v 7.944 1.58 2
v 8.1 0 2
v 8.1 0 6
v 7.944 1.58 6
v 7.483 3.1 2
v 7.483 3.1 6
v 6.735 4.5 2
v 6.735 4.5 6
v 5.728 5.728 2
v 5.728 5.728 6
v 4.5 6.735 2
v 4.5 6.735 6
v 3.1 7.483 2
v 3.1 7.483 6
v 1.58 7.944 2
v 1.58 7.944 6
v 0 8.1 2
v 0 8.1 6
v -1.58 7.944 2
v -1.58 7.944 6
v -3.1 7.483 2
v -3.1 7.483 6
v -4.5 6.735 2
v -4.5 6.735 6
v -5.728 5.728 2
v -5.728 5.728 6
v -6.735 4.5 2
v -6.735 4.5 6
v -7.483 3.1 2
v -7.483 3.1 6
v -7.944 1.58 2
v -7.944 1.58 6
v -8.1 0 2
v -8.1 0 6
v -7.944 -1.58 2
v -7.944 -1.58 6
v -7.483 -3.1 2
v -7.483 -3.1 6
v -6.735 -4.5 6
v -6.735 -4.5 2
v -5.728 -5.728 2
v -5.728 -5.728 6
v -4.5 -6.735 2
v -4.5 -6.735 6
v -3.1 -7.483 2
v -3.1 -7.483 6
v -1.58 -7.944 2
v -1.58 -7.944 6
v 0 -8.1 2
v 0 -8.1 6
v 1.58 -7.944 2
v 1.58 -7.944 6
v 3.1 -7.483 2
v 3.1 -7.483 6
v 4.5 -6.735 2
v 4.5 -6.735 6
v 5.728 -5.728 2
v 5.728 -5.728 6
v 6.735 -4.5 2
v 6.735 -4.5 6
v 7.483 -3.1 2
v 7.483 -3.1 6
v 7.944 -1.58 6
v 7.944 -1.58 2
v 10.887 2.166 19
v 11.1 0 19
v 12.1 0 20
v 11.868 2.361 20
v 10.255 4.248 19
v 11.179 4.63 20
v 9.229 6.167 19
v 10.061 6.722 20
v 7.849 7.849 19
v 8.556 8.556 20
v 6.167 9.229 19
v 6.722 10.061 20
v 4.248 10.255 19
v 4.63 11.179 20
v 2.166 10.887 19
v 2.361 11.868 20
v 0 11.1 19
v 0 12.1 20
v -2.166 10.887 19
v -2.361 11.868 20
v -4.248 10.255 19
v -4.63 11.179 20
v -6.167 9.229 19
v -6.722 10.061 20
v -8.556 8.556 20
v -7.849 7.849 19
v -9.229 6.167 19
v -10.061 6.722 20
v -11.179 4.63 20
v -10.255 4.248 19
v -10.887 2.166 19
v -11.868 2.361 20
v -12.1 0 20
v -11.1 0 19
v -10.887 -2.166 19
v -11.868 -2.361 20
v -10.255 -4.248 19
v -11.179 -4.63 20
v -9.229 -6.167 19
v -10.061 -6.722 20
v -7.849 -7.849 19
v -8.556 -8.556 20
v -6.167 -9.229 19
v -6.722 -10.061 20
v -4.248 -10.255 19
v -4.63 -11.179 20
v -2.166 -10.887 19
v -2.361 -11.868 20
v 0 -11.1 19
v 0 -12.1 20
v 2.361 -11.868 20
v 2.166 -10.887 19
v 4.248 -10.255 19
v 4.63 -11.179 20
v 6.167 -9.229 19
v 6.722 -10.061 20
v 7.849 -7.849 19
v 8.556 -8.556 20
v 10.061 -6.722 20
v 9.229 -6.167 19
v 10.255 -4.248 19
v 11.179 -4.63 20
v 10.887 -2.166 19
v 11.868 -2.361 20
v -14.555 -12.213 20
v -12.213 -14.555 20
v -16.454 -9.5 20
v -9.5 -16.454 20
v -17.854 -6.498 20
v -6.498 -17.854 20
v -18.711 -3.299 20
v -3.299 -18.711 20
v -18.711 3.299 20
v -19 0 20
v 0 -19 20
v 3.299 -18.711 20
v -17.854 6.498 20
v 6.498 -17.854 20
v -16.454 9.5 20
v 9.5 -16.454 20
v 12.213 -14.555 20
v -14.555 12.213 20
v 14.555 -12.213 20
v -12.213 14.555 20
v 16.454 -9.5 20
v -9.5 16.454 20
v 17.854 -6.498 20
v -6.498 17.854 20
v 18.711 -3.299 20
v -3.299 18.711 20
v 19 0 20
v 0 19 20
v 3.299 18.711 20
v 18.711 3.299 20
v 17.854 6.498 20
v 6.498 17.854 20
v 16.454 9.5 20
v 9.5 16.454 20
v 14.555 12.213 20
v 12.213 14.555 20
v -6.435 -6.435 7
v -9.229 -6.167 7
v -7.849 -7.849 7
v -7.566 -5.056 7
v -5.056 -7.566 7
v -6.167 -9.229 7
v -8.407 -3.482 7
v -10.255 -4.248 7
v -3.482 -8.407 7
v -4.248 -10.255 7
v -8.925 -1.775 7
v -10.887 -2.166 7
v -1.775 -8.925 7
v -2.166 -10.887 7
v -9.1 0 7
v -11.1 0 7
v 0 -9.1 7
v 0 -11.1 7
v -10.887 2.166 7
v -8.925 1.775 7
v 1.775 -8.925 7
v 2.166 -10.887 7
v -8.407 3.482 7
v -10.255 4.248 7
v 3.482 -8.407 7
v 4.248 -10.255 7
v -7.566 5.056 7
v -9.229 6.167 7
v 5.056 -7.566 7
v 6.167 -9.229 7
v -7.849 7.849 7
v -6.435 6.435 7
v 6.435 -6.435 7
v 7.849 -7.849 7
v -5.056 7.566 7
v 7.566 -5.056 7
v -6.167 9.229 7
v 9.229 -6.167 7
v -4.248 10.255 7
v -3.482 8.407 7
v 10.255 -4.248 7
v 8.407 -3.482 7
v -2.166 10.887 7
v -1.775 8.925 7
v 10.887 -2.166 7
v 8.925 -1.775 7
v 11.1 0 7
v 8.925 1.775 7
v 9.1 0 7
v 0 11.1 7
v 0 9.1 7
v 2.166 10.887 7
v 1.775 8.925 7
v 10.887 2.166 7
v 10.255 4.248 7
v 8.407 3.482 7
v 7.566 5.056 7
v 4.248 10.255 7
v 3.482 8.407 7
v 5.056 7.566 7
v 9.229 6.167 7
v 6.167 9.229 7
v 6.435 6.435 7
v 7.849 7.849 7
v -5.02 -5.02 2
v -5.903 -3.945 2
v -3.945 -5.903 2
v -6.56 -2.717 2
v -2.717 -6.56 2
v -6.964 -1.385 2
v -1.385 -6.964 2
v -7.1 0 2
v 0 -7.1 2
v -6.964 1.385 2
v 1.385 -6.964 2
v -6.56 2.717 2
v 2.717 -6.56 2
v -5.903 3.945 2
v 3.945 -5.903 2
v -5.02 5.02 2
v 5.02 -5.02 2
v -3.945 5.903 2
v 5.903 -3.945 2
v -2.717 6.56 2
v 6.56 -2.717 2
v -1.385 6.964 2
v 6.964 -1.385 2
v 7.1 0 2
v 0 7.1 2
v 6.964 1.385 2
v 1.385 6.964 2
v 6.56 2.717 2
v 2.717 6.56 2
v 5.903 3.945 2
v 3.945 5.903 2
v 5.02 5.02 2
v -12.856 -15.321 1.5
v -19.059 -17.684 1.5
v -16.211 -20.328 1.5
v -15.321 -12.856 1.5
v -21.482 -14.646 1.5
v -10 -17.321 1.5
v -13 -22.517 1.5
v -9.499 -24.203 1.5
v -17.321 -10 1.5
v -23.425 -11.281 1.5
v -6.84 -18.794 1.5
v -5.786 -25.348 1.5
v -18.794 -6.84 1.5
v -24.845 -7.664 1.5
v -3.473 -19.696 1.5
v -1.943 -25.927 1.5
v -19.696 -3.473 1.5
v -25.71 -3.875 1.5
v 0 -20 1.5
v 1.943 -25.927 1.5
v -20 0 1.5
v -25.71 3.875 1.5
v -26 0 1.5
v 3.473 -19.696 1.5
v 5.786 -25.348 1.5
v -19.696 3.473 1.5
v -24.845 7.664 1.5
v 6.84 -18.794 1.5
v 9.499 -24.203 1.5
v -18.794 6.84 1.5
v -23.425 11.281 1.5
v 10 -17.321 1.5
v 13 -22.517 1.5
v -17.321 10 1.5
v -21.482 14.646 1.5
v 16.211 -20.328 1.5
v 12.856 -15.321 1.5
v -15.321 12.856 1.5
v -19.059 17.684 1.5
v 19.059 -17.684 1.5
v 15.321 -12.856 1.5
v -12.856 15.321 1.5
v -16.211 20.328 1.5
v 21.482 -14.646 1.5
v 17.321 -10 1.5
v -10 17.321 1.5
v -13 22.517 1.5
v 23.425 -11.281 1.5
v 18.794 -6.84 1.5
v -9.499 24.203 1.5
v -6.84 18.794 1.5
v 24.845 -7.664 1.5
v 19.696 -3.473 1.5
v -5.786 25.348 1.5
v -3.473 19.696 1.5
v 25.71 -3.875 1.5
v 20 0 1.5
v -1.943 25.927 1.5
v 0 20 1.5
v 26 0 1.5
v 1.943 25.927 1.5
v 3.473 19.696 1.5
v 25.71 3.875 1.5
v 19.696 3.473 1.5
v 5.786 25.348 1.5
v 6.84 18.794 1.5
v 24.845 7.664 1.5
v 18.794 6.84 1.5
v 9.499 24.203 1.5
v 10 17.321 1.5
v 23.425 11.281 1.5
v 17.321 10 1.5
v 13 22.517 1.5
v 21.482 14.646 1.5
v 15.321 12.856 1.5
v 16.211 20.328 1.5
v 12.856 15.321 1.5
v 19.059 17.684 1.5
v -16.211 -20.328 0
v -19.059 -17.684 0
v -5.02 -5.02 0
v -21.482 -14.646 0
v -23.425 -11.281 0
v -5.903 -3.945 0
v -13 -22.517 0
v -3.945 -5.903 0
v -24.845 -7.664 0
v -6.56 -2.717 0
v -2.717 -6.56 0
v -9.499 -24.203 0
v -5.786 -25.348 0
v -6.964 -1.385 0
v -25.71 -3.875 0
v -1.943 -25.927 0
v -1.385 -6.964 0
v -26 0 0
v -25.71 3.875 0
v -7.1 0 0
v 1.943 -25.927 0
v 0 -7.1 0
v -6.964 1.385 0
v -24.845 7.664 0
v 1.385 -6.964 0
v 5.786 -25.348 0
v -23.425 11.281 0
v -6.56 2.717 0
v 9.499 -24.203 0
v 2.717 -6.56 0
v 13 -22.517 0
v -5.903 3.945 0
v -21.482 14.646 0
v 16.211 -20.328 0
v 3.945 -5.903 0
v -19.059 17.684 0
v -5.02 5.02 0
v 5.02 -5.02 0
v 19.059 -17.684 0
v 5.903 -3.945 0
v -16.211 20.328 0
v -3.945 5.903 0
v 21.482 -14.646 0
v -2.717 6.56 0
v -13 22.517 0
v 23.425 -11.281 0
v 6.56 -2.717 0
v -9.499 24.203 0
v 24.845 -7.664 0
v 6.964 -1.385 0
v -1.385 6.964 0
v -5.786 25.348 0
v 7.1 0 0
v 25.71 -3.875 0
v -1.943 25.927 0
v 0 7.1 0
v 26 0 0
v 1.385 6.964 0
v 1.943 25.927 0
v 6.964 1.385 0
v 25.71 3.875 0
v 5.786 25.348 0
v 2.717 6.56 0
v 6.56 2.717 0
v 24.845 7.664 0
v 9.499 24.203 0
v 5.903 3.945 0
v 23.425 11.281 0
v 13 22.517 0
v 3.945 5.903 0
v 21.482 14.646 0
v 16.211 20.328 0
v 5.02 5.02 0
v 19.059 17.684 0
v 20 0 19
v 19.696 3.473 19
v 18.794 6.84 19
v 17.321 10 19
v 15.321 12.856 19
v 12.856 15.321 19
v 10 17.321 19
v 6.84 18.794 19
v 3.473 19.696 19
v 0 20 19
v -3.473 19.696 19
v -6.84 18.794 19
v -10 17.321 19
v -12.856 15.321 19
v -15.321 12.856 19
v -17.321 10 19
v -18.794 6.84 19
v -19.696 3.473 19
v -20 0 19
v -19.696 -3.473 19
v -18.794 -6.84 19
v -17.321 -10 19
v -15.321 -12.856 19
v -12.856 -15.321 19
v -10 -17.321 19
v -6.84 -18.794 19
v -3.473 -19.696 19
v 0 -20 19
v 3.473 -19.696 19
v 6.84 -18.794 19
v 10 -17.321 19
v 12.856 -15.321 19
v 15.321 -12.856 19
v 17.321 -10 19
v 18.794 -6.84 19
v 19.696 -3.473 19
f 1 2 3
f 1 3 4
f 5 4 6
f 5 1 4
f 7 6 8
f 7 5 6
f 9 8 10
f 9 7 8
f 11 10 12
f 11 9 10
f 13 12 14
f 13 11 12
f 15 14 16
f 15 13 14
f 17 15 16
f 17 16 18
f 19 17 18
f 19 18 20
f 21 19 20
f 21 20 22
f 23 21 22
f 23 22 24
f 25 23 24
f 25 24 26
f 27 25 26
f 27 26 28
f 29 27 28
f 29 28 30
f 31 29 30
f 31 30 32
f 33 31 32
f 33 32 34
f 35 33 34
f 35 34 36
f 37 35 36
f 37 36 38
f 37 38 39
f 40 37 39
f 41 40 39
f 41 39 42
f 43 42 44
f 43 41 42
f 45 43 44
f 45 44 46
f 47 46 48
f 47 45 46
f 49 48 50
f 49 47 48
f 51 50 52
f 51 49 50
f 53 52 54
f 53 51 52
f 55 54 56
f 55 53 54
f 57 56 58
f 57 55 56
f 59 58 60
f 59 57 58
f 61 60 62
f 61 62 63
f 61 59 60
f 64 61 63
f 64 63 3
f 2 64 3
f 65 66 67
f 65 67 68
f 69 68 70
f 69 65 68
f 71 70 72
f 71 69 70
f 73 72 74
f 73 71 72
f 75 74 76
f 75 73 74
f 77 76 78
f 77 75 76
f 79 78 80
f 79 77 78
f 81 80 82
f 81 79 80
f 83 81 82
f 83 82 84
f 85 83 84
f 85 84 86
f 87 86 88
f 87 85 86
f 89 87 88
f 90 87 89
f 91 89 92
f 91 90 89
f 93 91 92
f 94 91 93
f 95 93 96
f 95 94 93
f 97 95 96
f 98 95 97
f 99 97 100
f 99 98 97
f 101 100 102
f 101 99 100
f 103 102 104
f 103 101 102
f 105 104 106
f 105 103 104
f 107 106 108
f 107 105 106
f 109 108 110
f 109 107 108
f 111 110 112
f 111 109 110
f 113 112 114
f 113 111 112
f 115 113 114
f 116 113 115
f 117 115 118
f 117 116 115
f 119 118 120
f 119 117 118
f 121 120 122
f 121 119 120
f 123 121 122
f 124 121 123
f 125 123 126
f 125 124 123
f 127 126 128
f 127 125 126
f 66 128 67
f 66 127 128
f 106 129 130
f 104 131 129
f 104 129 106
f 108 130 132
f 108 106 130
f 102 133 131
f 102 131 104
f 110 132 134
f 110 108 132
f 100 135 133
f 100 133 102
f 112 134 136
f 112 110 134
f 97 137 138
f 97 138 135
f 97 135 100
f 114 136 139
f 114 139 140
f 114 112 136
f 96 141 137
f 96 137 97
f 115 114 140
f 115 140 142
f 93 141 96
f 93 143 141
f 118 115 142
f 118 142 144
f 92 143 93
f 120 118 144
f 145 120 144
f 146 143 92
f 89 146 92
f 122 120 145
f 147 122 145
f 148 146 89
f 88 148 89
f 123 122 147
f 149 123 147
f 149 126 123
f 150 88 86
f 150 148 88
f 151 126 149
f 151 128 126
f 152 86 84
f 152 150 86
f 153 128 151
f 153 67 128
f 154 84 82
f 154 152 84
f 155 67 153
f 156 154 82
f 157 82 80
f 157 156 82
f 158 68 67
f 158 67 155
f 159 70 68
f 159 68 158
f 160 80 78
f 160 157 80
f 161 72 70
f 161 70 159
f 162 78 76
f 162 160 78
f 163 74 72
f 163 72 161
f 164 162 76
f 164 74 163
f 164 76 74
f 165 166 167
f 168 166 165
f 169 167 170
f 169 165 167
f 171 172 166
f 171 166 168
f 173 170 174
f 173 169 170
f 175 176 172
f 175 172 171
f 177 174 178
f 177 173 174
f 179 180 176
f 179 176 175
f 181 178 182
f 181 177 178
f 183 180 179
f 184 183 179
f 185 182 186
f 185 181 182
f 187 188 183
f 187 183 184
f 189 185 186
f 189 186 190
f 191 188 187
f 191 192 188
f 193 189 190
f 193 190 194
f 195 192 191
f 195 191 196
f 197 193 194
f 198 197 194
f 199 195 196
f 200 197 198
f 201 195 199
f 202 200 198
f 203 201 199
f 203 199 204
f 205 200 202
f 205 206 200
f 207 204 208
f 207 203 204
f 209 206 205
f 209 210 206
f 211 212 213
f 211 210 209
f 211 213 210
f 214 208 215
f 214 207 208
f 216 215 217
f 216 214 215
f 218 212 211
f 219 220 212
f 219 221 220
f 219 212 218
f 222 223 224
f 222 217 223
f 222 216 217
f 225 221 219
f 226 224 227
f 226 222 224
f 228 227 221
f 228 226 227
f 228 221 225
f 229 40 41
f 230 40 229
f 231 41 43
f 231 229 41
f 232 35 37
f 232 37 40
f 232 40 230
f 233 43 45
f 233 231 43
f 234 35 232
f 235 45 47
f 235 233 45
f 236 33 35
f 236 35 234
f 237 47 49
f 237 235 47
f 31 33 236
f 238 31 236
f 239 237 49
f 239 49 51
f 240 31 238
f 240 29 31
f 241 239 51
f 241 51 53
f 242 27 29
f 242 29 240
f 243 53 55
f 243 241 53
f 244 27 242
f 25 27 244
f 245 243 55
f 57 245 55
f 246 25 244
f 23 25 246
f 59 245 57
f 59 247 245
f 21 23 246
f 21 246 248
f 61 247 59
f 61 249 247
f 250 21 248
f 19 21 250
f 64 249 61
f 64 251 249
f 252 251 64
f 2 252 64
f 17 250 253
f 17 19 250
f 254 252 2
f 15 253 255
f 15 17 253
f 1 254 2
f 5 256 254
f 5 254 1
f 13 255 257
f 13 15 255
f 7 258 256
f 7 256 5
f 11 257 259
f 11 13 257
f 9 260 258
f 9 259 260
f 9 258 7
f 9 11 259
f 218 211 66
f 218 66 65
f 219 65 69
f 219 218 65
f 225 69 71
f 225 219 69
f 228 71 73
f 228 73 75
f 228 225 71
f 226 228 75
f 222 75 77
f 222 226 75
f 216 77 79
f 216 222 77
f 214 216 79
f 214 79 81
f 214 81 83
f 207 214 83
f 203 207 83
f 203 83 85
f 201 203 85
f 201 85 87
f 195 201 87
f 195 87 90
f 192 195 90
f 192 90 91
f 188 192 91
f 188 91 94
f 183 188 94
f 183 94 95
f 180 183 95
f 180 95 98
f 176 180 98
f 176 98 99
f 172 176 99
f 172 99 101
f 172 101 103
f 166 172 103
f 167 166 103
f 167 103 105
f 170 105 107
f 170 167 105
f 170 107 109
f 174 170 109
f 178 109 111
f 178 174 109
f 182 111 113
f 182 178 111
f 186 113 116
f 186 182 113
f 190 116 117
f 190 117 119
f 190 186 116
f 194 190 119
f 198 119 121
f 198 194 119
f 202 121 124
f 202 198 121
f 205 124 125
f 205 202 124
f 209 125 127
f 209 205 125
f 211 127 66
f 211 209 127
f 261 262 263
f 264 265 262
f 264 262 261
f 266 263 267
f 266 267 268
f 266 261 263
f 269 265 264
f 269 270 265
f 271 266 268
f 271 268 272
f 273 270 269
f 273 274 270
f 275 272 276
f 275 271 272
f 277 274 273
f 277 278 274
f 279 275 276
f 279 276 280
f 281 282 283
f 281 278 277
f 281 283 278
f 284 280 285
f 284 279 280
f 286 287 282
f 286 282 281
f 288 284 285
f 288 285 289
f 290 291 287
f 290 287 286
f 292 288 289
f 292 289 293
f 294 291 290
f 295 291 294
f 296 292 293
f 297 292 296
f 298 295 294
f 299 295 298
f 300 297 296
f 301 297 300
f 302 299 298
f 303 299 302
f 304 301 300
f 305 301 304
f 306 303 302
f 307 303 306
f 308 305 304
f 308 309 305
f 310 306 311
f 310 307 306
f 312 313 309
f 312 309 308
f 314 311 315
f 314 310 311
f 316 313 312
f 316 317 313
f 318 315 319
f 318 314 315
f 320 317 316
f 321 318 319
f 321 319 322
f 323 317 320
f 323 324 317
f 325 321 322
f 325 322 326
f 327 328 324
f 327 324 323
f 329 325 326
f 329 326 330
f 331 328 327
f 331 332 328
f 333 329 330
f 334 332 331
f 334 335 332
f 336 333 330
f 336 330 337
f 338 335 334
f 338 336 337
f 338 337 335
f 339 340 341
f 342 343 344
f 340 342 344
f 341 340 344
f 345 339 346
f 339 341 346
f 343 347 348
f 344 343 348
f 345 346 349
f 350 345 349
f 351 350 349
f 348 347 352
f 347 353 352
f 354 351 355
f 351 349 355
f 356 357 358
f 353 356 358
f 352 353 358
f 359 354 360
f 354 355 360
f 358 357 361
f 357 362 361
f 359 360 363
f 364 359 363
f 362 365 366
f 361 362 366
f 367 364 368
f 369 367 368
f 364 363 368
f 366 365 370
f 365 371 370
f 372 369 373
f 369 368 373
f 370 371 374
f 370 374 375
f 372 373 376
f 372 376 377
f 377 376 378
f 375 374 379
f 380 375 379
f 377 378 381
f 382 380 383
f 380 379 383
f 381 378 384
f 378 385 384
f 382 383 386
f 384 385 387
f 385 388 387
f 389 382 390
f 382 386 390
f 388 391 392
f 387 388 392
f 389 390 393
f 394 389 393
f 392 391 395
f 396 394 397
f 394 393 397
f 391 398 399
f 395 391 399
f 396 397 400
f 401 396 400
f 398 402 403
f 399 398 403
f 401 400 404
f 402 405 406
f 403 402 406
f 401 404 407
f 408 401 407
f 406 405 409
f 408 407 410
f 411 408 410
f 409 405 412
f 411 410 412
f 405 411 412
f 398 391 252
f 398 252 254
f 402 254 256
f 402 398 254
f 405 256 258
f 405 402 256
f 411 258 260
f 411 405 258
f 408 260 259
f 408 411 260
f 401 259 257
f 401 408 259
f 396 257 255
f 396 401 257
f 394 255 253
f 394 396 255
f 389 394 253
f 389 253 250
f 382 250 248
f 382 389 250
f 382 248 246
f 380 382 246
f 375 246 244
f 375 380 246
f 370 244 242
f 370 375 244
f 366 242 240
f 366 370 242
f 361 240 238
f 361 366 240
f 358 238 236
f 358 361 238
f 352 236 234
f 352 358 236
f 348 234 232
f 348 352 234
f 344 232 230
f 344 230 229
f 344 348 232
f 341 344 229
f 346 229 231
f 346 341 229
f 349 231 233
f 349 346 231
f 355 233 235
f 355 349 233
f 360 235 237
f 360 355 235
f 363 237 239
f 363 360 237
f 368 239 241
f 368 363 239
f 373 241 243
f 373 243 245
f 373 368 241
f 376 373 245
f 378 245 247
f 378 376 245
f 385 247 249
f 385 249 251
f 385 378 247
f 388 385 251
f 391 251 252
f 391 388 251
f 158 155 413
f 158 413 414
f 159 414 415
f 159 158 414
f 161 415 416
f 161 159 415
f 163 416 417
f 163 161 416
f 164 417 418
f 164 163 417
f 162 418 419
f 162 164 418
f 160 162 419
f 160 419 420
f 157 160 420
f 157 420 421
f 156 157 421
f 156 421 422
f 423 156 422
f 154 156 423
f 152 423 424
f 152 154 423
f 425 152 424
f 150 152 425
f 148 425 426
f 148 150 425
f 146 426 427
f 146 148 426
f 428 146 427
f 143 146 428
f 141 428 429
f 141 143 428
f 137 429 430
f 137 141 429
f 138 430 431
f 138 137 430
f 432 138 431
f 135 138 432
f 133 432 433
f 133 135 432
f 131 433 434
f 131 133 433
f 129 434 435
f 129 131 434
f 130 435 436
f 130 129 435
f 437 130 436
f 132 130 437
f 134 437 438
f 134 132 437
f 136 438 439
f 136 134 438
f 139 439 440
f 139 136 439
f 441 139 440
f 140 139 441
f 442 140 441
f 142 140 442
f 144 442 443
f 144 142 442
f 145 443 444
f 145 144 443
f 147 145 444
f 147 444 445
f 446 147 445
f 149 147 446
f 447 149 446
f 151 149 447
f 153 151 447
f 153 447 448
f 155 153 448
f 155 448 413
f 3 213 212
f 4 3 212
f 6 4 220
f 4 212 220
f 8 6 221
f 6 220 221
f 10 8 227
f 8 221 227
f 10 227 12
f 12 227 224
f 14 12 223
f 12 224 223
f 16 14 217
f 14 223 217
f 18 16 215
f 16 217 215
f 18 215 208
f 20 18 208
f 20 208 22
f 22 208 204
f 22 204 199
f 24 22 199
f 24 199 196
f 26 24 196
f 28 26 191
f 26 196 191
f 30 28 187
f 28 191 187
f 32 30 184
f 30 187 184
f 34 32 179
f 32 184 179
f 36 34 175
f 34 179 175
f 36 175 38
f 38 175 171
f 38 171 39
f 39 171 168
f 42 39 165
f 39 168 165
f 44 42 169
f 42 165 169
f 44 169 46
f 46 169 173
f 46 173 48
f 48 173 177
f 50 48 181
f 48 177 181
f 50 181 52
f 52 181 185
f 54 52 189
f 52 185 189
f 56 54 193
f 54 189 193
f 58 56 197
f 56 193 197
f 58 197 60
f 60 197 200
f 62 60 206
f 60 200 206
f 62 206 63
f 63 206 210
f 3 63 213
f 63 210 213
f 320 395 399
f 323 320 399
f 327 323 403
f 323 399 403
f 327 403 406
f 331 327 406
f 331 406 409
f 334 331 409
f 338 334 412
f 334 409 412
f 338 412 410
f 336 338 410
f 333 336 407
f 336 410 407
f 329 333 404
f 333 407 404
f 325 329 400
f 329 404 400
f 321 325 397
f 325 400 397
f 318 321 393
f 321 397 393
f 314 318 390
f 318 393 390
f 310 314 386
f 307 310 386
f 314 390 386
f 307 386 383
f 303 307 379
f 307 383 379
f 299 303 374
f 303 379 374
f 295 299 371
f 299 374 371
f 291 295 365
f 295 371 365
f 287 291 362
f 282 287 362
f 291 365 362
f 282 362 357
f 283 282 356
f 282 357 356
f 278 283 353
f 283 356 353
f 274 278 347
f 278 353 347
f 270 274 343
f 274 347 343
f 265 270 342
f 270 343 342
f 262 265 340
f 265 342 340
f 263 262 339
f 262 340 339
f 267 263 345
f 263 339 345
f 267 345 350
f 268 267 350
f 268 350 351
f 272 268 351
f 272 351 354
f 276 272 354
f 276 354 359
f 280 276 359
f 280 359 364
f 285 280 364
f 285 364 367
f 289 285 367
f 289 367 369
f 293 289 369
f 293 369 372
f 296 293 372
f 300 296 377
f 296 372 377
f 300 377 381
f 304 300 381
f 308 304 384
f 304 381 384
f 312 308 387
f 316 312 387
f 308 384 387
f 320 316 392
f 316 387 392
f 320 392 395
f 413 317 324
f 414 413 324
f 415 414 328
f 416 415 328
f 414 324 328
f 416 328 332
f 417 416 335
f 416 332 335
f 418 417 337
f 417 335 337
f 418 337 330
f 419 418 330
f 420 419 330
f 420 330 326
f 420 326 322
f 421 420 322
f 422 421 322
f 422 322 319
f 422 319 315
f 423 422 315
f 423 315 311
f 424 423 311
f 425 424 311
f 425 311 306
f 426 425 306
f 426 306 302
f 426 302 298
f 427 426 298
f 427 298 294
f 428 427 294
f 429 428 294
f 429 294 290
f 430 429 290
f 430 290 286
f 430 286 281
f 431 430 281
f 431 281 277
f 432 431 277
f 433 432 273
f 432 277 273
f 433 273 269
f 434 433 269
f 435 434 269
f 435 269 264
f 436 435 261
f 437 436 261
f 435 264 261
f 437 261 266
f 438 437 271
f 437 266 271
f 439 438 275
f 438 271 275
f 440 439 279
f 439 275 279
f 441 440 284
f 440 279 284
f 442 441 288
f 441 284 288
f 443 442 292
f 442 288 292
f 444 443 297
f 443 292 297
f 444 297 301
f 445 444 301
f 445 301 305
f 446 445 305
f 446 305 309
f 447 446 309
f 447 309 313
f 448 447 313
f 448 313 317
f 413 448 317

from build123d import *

# Parameters (mm, degrees)
F0_R     = 8.1
F0_R_2   = 7.1
F1_DEPTH = 2
F0_R_3   = 11.1
F2_DEPTH = 7
F0_R_4   = 20
F3_DEPTH = 20
F0_R_5   = 26
F4_DEPTH = 1.5
F5_SIZE  = 1


with BuildPart() as f1:
    # F0 (on Top) → F1 (new body)
    with BuildSketch(Plane.XY):
        Circle(F0_R)
        Circle(F0_R_2, mode=Mode.SUBTRACT)
    extrude(amount=F1_DEPTH)

    # F0 (on Top) → F2 (join)
    with BuildSketch(Plane.XY):
        Circle(F0_R_3)
        Circle(F0_R, mode=Mode.SUBTRACT)
    extrude(amount=F2_DEPTH)

    # F0 (on Top) → F3 (join)
    with BuildSketch(Plane.XY):
        Circle(F0_R_4)
        Circle(F0_R_3, mode=Mode.SUBTRACT)
    extrude(amount=F3_DEPTH)

    # F0 (on Top) → F4 (join)
    with BuildSketch(Plane.XY):
        Circle(F0_R_5)
        Circle(F0_R_4, mode=Mode.SUBTRACT)
    extrude(amount=F4_DEPTH)

    # F5
    f5_edges = [f1.edges().sort_by_distance(p)[0] for p in [
        (-20, 0, 20),
        (-11.1, 0, 20),
        (-8.1, 0, 7),
    ]]
    chamfer(f5_edges, length=F5_SIZE)


solid = f1.part
